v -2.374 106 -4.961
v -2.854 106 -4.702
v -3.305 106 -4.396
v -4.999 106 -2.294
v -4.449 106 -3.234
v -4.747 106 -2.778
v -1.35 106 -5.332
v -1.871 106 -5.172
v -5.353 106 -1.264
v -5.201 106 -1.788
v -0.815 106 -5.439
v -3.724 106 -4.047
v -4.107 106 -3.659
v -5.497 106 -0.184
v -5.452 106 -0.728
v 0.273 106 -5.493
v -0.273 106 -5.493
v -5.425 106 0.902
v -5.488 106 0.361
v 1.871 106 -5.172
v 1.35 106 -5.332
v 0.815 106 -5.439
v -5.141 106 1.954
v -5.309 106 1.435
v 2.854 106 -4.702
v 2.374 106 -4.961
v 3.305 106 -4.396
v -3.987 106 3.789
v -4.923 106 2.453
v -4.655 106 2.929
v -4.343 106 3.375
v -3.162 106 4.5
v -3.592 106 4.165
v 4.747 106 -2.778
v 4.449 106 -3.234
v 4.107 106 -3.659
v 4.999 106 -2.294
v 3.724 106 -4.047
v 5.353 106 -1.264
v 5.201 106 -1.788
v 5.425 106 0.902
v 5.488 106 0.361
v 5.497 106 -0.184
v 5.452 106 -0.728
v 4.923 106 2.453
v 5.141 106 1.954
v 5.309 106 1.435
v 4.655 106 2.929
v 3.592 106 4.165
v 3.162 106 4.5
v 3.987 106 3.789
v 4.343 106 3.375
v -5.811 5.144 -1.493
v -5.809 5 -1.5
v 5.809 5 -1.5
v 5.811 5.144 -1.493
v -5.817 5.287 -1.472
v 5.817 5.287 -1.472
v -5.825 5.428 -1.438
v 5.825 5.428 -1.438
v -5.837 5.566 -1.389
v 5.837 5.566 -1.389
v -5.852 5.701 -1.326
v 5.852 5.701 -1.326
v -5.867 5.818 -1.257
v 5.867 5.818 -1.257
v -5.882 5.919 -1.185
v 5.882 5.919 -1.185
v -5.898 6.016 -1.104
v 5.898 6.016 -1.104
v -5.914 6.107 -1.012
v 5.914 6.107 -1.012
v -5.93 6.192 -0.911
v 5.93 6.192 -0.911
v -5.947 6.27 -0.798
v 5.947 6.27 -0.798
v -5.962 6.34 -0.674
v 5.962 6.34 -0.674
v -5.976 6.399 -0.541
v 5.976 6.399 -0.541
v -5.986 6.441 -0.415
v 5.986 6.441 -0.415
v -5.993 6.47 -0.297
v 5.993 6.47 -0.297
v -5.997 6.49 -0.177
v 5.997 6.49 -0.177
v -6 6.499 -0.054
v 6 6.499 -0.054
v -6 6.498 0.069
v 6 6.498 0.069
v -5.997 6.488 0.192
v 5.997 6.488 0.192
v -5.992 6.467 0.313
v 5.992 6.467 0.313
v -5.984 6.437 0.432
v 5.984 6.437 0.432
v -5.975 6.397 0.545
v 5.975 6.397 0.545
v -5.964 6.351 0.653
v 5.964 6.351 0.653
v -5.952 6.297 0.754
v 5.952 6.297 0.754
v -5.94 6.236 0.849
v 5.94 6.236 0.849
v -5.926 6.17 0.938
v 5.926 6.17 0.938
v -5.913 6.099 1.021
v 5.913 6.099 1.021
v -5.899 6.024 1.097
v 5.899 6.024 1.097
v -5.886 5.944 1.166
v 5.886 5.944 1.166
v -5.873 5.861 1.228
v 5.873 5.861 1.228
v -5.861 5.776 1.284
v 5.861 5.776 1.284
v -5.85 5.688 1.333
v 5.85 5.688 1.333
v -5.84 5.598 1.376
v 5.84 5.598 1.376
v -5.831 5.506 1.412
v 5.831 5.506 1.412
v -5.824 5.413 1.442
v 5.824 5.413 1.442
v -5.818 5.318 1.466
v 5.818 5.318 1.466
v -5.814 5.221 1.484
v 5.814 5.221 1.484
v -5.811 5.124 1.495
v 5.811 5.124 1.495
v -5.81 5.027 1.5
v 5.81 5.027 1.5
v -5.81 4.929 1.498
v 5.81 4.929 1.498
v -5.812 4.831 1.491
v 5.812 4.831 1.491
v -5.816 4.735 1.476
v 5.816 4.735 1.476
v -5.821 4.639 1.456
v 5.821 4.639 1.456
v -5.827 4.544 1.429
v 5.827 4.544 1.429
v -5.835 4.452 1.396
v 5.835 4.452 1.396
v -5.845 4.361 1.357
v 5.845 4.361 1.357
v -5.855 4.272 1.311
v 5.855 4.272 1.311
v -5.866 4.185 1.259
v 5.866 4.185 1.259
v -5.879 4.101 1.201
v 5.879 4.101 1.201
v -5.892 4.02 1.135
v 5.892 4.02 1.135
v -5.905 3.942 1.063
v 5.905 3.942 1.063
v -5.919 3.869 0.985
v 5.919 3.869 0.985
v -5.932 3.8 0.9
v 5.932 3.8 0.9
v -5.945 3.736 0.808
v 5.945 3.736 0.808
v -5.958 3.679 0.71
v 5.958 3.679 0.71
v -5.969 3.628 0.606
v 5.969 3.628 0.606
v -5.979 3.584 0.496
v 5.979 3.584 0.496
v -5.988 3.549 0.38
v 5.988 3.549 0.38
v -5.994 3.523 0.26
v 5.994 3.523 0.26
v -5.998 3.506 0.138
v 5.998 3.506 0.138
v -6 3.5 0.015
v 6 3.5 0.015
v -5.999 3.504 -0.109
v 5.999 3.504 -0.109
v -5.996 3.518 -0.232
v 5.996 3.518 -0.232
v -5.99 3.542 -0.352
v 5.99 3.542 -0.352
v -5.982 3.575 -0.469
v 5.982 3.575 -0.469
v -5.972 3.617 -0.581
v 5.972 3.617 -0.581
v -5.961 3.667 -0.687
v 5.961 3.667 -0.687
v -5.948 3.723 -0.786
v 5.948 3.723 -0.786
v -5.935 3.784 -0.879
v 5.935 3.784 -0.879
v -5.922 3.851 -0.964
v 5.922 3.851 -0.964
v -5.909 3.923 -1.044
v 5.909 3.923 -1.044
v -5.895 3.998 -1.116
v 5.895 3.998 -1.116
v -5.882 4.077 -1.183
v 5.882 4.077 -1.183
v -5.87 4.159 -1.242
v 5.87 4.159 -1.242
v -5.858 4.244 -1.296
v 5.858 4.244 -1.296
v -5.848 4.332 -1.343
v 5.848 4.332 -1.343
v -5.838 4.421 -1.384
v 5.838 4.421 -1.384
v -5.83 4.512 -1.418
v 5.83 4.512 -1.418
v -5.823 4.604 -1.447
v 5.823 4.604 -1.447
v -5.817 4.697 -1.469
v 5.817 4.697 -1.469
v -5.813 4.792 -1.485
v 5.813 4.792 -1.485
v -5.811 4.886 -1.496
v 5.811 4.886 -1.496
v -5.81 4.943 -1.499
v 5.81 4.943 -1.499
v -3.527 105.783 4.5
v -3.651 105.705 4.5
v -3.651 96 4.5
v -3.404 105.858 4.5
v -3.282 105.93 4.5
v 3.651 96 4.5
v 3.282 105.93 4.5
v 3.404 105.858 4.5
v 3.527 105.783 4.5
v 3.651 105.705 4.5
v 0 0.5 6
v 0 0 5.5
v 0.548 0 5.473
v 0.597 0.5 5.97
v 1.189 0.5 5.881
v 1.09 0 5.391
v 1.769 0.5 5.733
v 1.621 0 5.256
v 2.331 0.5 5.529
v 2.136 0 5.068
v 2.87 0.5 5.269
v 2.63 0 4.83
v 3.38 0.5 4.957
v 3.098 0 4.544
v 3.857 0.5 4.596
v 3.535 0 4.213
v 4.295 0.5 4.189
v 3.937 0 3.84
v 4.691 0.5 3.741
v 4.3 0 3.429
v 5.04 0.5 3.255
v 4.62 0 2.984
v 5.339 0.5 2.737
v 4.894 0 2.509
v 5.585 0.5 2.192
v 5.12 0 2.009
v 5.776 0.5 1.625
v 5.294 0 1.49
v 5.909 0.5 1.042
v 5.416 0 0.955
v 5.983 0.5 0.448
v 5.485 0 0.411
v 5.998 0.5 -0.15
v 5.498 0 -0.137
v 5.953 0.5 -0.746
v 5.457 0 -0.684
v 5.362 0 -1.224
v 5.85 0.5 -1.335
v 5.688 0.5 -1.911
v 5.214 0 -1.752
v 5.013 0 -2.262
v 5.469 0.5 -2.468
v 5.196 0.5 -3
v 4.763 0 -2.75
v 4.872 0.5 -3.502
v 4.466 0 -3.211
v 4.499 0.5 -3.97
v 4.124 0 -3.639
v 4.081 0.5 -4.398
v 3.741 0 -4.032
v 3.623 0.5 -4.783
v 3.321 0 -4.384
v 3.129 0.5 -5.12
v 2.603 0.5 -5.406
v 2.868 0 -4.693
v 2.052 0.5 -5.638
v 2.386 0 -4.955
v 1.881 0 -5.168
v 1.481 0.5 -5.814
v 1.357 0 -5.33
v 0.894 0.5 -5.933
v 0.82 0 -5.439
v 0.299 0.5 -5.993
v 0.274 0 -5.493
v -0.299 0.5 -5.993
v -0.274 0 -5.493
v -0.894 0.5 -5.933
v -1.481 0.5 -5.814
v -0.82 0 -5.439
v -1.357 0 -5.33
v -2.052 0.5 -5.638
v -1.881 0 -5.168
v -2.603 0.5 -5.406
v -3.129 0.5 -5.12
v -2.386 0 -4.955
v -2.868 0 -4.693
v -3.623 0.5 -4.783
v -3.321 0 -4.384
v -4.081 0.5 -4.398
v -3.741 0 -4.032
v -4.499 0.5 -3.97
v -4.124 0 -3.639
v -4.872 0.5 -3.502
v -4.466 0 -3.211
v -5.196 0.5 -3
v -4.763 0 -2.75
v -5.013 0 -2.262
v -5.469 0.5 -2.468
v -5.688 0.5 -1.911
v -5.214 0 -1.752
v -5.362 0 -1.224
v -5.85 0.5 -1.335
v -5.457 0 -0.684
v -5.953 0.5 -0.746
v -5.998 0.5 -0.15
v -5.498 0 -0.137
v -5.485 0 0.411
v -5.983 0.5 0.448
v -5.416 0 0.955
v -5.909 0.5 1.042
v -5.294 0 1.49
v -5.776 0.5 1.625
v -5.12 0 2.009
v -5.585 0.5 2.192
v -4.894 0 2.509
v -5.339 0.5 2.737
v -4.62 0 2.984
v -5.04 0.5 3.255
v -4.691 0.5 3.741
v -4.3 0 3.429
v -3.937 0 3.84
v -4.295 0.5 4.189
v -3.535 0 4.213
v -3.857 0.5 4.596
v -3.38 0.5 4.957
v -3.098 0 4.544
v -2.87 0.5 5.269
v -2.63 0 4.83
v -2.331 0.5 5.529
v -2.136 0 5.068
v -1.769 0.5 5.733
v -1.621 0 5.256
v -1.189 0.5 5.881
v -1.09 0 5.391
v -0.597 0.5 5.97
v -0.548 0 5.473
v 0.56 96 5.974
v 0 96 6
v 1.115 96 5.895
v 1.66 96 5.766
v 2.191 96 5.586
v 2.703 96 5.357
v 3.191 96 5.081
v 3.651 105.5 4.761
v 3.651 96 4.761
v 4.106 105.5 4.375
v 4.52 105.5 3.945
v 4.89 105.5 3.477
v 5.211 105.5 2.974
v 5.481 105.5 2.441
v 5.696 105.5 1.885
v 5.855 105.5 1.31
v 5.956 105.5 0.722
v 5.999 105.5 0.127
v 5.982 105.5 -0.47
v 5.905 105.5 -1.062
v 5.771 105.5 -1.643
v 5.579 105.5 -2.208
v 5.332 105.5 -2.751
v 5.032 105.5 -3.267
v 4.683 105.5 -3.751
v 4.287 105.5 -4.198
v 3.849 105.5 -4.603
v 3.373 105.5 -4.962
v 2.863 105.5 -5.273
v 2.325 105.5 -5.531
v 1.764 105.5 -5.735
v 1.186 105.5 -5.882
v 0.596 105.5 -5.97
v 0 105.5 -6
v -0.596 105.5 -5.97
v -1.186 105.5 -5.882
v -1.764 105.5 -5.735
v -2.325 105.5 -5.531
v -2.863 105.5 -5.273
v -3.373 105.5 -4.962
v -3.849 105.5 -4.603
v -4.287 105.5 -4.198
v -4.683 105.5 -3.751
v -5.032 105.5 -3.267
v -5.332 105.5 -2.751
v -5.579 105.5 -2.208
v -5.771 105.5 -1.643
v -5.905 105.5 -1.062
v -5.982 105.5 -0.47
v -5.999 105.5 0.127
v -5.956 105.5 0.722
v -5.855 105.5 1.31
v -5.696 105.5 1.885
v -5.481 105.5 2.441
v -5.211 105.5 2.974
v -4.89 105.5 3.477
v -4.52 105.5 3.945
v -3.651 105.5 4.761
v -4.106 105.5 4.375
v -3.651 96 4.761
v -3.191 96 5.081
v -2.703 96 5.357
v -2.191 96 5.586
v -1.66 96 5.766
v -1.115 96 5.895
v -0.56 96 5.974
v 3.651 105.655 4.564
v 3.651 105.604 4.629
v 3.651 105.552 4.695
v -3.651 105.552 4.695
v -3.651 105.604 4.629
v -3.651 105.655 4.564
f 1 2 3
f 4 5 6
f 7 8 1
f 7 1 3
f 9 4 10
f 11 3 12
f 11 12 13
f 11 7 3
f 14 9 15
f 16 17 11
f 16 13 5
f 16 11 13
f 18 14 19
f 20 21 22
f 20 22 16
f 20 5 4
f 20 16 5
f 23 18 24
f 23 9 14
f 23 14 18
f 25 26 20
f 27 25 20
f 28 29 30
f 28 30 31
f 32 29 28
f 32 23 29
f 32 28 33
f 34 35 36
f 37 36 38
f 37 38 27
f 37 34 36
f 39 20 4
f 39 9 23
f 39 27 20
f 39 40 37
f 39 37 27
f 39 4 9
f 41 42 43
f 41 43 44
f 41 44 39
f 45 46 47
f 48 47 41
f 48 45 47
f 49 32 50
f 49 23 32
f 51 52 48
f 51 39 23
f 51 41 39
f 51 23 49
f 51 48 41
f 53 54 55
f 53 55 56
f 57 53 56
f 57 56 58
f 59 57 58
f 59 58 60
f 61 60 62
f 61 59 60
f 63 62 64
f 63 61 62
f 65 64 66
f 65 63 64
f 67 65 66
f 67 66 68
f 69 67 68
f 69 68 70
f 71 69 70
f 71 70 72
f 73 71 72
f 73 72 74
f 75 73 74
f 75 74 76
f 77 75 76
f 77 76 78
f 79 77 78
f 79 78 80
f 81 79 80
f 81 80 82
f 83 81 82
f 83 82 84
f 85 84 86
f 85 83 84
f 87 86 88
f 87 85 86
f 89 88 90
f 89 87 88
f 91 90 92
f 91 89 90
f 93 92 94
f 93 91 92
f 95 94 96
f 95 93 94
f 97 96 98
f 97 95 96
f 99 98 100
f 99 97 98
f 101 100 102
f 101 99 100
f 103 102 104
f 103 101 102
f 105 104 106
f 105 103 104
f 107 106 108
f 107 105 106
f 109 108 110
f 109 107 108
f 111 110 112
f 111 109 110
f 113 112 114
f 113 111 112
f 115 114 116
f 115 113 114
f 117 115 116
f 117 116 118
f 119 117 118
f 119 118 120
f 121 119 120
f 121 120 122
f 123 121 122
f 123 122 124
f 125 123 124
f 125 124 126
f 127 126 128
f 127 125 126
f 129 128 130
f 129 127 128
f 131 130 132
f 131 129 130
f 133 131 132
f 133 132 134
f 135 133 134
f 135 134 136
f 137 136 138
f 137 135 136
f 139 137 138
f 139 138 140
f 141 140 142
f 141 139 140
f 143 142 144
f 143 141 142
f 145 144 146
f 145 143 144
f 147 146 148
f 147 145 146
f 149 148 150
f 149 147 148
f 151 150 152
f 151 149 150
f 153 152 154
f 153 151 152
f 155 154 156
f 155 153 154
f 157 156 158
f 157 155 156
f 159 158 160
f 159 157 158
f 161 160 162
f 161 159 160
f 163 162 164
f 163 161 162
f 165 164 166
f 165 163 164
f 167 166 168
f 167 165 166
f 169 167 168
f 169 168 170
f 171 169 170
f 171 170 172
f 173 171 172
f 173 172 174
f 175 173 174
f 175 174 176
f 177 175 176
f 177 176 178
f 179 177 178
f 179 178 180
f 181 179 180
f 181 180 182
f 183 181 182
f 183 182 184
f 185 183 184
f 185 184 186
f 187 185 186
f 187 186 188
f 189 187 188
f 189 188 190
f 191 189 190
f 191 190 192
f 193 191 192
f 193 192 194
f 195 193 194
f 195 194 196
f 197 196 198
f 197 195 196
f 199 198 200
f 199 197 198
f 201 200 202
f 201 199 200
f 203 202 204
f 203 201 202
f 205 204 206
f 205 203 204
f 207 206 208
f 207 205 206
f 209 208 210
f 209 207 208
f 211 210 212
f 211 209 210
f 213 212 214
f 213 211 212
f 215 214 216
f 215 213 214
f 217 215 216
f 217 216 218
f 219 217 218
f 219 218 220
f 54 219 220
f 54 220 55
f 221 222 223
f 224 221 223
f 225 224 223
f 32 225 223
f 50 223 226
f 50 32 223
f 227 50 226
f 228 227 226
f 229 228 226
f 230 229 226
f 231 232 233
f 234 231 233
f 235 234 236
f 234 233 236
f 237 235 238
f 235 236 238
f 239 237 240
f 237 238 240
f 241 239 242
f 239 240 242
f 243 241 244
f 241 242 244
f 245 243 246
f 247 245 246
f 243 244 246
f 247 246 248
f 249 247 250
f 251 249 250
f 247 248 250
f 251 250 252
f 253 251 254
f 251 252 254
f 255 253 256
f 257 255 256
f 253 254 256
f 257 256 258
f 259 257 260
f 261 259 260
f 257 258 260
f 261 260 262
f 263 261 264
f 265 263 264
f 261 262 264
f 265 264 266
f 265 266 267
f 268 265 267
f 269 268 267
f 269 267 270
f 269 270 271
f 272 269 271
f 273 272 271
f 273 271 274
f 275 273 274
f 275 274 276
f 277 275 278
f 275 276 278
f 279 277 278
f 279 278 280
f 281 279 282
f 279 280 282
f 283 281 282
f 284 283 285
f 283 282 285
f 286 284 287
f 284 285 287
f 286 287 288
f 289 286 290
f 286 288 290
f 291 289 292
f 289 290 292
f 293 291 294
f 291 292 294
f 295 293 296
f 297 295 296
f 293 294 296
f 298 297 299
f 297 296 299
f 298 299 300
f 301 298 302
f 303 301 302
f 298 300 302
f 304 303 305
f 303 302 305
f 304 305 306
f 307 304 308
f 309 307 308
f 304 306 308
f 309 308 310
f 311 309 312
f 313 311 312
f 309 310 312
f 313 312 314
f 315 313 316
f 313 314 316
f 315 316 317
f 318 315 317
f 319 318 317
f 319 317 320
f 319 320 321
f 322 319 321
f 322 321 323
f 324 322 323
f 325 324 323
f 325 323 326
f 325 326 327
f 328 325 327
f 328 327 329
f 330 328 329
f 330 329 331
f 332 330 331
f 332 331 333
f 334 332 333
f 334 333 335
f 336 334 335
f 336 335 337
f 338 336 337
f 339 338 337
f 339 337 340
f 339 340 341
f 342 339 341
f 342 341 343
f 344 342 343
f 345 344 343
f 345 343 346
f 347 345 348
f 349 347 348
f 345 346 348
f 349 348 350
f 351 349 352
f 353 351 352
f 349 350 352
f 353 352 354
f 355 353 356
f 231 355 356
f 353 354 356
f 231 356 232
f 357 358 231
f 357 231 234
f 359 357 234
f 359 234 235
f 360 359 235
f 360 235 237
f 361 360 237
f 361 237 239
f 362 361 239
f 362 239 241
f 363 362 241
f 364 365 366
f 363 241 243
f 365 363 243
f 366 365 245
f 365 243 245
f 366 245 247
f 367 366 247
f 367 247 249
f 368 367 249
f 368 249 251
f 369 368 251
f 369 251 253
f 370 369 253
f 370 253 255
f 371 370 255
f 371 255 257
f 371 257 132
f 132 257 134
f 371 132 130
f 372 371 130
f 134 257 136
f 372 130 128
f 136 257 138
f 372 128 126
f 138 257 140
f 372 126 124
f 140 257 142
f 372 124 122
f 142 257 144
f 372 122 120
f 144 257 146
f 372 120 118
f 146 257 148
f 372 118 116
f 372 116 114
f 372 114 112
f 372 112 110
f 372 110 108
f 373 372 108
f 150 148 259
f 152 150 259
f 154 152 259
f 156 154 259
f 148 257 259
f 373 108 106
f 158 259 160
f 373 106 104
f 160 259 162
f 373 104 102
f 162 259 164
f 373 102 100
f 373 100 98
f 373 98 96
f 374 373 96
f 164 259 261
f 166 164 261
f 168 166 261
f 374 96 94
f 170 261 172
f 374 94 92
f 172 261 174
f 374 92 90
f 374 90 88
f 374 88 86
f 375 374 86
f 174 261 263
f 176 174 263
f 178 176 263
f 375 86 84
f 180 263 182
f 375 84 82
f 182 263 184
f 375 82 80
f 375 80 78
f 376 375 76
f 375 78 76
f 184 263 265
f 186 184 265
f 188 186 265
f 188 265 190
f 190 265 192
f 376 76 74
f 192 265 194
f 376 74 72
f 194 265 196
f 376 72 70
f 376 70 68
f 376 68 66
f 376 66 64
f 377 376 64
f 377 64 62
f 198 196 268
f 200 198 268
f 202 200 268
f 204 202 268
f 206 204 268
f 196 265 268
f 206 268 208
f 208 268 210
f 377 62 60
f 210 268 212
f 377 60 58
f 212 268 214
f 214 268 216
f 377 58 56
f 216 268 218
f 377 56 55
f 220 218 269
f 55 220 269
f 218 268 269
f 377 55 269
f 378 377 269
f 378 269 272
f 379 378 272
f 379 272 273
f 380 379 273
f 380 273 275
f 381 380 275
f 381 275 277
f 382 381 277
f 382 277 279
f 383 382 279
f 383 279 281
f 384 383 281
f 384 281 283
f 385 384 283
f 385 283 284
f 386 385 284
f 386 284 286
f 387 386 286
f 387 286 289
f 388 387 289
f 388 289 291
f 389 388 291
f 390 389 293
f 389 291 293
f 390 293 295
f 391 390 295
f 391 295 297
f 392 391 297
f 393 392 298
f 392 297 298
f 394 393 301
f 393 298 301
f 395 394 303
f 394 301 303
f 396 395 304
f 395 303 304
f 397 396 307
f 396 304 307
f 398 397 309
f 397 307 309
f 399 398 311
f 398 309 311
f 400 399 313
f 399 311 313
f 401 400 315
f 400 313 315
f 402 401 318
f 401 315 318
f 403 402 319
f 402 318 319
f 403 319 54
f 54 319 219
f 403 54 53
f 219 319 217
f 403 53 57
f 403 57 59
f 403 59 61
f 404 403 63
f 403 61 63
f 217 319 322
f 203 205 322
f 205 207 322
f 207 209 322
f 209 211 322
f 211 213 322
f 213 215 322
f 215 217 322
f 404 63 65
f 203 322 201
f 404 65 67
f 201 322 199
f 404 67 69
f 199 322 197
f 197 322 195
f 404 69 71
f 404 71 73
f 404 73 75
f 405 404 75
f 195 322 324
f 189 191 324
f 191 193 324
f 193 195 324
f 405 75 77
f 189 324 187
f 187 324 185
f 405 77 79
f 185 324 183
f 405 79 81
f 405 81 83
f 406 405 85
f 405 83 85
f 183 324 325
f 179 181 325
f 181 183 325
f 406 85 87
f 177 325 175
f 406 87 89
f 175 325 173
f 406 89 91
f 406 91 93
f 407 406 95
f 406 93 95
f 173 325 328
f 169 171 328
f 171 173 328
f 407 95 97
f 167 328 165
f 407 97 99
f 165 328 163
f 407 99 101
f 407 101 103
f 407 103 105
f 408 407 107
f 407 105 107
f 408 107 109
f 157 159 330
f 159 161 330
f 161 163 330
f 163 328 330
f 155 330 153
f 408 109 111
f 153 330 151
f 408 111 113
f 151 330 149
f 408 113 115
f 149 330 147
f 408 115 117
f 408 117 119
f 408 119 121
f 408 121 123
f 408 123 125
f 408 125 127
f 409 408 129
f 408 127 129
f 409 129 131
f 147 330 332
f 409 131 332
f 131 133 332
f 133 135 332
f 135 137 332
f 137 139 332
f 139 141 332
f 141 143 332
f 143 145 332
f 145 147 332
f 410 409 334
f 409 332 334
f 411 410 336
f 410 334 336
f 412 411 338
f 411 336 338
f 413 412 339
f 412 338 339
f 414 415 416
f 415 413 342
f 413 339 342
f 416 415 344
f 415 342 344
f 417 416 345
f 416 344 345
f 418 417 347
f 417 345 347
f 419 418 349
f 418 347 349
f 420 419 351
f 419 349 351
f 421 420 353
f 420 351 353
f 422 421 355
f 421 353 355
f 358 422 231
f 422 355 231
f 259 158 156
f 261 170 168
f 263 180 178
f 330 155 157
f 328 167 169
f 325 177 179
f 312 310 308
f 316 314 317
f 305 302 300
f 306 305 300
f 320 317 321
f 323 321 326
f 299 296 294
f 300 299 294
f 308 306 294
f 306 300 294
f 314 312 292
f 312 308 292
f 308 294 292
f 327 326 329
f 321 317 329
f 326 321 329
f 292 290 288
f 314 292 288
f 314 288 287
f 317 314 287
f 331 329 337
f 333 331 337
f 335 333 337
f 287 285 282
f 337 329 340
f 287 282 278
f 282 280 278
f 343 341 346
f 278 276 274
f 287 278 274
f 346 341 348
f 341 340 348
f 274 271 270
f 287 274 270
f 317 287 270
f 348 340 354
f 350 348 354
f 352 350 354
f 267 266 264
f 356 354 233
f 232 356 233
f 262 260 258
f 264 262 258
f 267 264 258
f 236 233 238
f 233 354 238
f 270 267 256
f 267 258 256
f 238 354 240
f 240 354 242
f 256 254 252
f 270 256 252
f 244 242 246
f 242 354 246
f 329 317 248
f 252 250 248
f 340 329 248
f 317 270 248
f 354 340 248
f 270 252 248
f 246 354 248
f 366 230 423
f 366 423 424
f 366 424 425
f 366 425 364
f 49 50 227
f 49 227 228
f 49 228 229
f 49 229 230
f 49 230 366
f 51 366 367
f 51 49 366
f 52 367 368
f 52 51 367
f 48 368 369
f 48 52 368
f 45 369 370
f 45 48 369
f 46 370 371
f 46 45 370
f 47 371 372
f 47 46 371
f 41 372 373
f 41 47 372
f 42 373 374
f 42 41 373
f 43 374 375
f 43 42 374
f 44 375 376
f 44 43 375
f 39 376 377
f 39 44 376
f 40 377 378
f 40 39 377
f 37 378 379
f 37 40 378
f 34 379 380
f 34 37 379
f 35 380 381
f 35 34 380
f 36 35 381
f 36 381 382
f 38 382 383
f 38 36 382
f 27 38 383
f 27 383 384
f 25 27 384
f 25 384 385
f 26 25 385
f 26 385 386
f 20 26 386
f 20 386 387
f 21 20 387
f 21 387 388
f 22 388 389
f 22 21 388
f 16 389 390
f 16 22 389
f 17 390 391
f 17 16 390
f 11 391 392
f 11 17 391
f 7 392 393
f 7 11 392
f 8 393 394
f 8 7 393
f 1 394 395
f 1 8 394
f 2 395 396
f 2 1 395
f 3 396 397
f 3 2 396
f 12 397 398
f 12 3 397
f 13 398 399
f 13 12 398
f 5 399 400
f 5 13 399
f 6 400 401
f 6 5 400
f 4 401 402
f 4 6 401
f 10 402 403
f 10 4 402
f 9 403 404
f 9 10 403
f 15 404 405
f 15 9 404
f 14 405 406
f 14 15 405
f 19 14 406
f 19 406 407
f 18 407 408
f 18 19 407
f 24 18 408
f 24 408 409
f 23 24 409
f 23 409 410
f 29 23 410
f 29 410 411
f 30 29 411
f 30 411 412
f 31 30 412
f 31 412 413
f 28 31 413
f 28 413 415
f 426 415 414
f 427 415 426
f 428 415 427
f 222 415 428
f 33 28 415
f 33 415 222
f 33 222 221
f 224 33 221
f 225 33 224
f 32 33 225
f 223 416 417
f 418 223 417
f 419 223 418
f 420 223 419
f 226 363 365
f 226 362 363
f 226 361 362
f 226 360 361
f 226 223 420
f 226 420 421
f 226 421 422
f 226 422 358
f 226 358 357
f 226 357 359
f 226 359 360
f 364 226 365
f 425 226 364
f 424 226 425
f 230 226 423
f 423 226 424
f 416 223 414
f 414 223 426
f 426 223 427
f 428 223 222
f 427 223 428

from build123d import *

# Parameters (mm, degrees)
SKETCH1_R               = 6
BOSS_EXTRUDE1_DEPTH     = 106
CHAMFER1_SIZE           = 0.5
CUT_EXTRUDE1_DEPTH      = 107.339080304
CUT_EXTRUDE1_DEPTH_BACK = 107.339080304
SKETCH2_R               = 1.5
SKETCH4_W               = 7.302801642
SKETCH4_H               = 16.597276459
CUT_EXTRUDE2_DEPTH      = 107.687628166


with BuildPart() as part:
    # Sketch1 → Boss-Extrude1 (new body)
    with BuildSketch(Plane(origin=(0, 0, 0), x_dir=(1, 0, 0), z_dir=(0, 1, 0))):
        with Locations(Location((0, 0, 0), (0, 0, 270))):
            Circle(SKETCH1_R)
    extrude(amount=BOSS_EXTRUDE1_DEPTH)

    # Chamfer1
    chamfer1_edges = [part.edges().sort_by_distance(p)[0] for p in [
        (0, 0, -6),
        (0, 106, -6),
    ]]
    chamfer(chamfer1_edges, length=CHAMFER1_SIZE)

    # Sketch2 → Cut-Extrude1 (cut, two sides: drawn at the far end of the back side and taken through both)
    with BuildSketch(Plane(origin=(0, 0, 0), x_dir=(0, 0, -1), z_dir=(1, 0, 0)).offset(-CUT_EXTRUDE1_DEPTH_BACK)):
        with Locations((0, 5)):
            Circle(SKETCH2_R)
    extrude(amount=CUT_EXTRUDE1_DEPTH + CUT_EXTRUDE1_DEPTH_BACK, mode=Mode.SUBTRACT)

    # Sketch4 → Cut-Extrude2 (cut, through all)
    with BuildSketch(Plane.XY.offset(4.5)):
        with Locations((0, 104.298638229)):
            Rectangle(SKETCH4_W, SKETCH4_H)
    extrude(amount=CUT_EXTRUDE2_DEPTH, mode=Mode.SUBTRACT)


solid = part.part
